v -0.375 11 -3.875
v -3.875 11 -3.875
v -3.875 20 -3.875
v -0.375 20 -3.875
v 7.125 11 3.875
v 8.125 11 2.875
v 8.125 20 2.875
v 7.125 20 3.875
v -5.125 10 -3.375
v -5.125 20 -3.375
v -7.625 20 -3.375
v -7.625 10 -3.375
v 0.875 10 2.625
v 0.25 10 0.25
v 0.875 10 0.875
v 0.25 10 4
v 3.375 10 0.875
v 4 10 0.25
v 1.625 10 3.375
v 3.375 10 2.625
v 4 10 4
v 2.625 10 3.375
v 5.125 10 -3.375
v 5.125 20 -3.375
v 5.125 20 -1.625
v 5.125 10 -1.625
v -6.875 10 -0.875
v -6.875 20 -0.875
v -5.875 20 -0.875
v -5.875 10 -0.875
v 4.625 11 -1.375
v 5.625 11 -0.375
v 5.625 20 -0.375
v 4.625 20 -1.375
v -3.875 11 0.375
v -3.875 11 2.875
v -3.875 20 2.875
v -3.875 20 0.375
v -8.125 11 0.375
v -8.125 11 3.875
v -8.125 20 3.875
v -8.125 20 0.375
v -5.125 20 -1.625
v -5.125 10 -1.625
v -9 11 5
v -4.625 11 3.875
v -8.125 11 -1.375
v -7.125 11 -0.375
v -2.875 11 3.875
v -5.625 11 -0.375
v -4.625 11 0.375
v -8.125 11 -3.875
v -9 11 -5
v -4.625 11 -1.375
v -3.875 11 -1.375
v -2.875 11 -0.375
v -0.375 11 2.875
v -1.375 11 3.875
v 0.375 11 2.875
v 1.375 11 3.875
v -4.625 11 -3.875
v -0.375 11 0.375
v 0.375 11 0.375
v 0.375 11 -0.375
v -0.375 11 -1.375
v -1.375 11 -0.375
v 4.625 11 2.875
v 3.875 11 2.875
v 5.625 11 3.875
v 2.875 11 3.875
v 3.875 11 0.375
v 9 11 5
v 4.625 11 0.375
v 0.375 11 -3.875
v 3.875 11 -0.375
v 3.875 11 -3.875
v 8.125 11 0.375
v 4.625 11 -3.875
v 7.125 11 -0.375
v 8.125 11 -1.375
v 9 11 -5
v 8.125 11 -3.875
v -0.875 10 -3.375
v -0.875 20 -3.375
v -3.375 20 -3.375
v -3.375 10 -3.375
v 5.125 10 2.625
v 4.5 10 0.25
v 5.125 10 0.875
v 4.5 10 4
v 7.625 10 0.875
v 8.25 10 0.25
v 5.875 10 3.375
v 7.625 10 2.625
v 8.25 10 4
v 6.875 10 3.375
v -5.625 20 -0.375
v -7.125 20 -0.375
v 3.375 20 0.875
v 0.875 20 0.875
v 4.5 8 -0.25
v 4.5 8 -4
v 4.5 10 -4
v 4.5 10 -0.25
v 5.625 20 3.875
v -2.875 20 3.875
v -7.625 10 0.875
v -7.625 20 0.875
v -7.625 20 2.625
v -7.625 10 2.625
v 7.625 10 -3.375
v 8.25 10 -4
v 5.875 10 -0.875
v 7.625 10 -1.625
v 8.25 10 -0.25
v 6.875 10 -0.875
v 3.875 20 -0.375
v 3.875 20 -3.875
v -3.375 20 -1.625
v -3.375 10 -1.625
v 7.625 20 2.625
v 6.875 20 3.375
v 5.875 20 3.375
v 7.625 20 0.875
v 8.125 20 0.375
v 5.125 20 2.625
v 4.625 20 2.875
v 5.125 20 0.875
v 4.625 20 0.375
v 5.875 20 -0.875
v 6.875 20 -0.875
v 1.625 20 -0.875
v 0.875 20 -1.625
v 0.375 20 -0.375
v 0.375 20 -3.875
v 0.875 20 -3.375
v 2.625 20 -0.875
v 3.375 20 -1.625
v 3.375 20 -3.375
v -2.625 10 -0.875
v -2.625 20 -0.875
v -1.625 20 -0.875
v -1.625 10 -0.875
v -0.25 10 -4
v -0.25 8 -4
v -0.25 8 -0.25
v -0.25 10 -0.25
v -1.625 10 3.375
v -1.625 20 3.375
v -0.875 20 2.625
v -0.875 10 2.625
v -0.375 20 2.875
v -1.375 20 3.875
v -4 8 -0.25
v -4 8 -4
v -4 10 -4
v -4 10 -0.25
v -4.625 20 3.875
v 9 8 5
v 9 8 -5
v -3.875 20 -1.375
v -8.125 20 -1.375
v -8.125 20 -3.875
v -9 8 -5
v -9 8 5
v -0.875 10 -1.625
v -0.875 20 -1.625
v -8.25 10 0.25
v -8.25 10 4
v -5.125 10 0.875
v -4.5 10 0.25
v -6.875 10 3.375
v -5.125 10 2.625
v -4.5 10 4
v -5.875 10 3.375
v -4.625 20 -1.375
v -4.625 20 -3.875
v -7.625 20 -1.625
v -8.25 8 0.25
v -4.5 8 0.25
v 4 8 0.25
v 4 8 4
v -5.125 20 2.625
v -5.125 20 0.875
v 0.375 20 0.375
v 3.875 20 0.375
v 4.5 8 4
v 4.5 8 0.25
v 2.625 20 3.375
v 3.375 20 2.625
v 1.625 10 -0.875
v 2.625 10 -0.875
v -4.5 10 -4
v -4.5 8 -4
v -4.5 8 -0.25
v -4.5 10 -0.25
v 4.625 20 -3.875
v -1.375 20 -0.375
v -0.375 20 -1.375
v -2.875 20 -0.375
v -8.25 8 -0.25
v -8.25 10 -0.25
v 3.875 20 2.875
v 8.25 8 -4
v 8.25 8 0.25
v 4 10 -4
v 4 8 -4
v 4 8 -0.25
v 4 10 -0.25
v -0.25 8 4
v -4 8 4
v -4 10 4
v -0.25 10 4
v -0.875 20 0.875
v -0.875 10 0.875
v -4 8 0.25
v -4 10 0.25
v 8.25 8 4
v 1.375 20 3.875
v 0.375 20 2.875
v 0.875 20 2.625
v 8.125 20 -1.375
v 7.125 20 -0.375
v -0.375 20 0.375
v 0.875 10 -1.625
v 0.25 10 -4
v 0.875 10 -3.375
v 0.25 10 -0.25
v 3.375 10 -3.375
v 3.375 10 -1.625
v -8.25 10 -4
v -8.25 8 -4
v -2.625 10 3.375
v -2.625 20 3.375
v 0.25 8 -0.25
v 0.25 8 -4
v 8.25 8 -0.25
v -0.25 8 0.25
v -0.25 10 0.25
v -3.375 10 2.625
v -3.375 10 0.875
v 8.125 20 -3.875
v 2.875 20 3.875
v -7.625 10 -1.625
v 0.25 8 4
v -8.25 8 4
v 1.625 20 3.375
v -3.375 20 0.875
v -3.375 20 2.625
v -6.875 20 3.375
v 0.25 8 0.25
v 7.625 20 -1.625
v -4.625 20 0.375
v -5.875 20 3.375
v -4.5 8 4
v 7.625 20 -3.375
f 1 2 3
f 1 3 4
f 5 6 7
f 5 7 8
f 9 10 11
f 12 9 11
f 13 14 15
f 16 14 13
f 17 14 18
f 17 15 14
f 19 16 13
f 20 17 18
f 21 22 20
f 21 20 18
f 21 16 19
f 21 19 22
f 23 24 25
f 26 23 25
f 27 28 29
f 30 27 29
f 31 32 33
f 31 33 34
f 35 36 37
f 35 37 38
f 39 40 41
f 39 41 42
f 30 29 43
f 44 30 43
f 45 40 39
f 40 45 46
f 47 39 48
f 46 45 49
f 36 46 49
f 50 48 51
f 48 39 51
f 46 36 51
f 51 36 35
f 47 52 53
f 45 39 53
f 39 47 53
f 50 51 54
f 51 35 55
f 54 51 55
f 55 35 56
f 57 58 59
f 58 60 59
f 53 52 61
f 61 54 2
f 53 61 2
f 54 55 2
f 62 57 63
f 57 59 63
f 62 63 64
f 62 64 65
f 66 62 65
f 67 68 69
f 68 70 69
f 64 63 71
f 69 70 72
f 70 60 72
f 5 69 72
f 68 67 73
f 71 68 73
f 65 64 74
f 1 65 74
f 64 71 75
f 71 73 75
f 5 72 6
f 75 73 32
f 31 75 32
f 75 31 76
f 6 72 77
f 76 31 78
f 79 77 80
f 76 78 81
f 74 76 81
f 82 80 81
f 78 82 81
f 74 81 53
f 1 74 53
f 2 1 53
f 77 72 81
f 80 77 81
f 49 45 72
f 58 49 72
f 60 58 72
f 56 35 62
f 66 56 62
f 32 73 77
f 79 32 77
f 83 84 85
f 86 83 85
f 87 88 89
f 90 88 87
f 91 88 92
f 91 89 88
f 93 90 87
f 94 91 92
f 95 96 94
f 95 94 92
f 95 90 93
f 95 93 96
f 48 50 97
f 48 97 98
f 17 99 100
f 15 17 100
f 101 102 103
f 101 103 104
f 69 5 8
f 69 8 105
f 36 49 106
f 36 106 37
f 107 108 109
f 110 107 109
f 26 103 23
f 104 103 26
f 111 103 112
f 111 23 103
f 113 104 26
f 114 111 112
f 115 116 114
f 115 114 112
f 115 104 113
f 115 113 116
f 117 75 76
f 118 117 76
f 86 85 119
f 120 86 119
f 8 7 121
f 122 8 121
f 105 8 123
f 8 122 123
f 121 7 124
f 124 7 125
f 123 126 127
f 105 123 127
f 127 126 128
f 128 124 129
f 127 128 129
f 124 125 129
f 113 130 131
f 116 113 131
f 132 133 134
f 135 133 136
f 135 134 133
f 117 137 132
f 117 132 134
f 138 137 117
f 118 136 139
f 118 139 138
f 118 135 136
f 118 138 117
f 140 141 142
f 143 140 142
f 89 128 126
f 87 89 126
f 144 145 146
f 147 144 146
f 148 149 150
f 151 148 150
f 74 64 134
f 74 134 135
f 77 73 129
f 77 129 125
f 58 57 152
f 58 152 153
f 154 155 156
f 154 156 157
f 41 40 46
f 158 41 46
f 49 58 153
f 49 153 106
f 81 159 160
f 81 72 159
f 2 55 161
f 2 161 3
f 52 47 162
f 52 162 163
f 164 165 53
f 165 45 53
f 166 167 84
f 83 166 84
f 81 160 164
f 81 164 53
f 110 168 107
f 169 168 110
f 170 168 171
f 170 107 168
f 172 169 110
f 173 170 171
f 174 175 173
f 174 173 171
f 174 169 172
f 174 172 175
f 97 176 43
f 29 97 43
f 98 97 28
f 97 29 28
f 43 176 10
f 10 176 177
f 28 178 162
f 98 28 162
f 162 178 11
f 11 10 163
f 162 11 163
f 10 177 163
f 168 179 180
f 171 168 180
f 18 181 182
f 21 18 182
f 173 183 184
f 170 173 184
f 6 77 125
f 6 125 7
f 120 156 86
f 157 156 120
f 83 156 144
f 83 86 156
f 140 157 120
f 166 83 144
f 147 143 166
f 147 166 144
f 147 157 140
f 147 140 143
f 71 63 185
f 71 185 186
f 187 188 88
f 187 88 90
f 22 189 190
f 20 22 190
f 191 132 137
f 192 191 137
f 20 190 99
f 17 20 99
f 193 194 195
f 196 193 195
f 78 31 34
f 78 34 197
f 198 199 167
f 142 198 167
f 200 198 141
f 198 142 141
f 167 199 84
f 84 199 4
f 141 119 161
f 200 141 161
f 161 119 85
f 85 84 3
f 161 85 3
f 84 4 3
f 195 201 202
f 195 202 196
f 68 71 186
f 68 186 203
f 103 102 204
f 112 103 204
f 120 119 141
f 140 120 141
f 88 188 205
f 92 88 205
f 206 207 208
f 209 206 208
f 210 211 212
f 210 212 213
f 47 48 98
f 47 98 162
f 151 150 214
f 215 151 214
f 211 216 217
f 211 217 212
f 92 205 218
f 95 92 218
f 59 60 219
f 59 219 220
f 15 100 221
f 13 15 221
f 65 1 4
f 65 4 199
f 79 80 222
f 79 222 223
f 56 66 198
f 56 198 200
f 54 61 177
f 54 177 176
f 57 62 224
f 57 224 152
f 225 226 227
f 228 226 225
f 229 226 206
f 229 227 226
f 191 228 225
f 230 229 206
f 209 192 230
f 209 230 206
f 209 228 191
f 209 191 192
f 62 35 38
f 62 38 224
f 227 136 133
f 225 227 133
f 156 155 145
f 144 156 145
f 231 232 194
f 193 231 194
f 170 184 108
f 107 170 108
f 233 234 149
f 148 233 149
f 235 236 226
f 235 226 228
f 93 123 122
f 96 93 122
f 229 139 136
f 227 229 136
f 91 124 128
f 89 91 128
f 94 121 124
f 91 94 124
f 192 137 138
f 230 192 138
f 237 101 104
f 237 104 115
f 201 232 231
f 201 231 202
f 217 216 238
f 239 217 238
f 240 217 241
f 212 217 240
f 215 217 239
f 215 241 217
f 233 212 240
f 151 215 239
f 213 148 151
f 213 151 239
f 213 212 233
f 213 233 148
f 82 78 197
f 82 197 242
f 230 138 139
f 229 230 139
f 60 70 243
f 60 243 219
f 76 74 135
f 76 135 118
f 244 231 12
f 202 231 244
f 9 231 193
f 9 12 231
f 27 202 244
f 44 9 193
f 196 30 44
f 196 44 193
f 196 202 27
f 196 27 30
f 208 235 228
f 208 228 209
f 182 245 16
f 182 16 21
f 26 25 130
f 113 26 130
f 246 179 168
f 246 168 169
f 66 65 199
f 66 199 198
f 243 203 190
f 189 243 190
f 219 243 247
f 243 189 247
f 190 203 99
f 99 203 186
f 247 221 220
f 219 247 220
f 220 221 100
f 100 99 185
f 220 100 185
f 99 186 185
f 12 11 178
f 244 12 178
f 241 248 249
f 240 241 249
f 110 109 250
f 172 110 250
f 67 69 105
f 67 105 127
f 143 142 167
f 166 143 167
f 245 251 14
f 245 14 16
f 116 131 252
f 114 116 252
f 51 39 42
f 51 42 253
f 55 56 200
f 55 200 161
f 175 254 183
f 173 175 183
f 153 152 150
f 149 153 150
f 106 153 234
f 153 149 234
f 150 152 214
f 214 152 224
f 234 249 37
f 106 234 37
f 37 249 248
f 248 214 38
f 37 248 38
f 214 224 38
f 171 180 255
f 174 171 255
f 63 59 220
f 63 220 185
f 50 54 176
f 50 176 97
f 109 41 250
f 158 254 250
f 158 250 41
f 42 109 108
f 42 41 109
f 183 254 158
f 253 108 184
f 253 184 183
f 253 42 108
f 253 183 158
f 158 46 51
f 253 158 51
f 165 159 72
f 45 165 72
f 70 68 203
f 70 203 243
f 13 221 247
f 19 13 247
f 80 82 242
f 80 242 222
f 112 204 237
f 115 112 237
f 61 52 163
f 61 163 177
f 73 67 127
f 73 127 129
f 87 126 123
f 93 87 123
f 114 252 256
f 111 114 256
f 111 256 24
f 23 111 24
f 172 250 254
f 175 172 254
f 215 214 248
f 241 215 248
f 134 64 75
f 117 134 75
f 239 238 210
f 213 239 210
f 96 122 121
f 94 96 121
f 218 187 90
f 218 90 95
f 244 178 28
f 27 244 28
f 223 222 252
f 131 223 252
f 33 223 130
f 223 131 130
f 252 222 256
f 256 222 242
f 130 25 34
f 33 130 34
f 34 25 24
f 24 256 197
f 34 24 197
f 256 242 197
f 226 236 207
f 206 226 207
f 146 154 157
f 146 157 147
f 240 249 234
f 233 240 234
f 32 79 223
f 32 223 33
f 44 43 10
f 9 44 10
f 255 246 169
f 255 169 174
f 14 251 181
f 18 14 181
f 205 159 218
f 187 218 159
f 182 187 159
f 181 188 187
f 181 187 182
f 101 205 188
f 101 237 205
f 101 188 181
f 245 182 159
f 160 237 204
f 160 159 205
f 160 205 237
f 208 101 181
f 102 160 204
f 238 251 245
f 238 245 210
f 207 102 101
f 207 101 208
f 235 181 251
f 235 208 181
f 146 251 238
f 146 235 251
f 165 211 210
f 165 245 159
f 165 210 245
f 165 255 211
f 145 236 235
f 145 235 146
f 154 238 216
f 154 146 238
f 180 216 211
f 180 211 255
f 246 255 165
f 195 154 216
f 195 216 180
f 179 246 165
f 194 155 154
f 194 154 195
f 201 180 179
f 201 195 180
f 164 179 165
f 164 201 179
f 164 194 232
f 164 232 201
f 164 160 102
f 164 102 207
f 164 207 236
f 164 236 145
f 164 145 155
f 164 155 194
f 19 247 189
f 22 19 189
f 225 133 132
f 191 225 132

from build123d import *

# Parameters (mm, degrees)
SKIZZE1_W                       = 10
SKIZZE1_H                       = 11
AUFSATZ_LINEAR_AUSTRAGEN1_DEPTH = 9
SKIZZE2_W                       = 1.5
SKIZZE2_H                       = 1
AUFSATZ_LINEAR_AUSTRAGEN2_DEPTH = 9
SKIZZE6_W                       = 3.75
SKIZZE6_H                       = 3.75
SCHNITT_LINEAR_AUSTRAGEN2_DEPTH = 10
LINEARES_MUSTER1_COUNT          = 4
LINEARES_MUSTER1_PITCH          = 4.25
LINEARES_MUSTER1_COUNT_DIR2     = 2
LINEARES_MUSTER1_PITCH_DIR2     = 4.25
SKIZZE7_W                       = 3.5
SKIZZE7_H                       = 3.5
AUFSATZ_LINEAR_AUSTRAGEN5_DEPTH = 9
LINEARES_MUSTER2_COUNT          = 3
LINEARES_MUSTER2_PITCH          = 4.25
LINEARES_MUSTER2_COUNT_DIR2     = 2
LINEARES_MUSTER2_PITCH_DIR2     = 4.25
AUFSATZ_LINEAR_AUSTRAGEN7_DEPTH = 9
LINEARES_MUSTER4_COUNT          = 4
LINEARES_MUSTER4_PITCH          = 4.25
LINEARES_MUSTER4_COUNT_DIR2     = 2
LINEARES_MUSTER4_PITCH_DIR2     = 4.25
SCHNITT_LINEAR_AUSTRAGEN4_DEPTH = 23.874658467
LINEARES_MUSTER6_COUNT          = 4
LINEARES_MUSTER6_PITCH          = 4.25
LINEARES_MUSTER6_COUNT_DIR2     = 2
LINEARES_MUSTER6_PITCH_DIR2     = 4.25
SKETCH_3_W                      = 20.071123044
SKETCH_3_H                      = 21.030403289
CUT_EXTRUDE_1_DEPTH             = 8


with BuildPart() as part:
    # Skizze1 → Aufsatz-Linear austragen1 (new, symmetric)
    with BuildSketch(Plane(origin=(0, 0, 0), x_dir=(0, 0, -1), z_dir=(1, 0, 0))):
        with Locations((0, 5.5)):
            Rectangle(SKIZZE1_W, SKIZZE1_H)
    extrude(amount=AUFSATZ_LINEAR_AUSTRAGEN1_DEPTH, both=True)

    # Skizze2 → Aufsatz-Linear austragen2 (add, symmetric)
    with BuildSketch(Plane(origin=(0, 0, 0), x_dir=(0, 0, -1), z_dir=(1, 0, 0))):
        with Locations((-5.75, 0.5)):
            Rectangle(SKIZZE2_W, SKIZZE2_H)
        with Locations((5.75, 0.5)):
            Rectangle(SKIZZE2_W, SKIZZE2_H)
    extrude(amount=AUFSATZ_LINEAR_AUSTRAGEN2_DEPTH, both=True)

    # Skizze6 → Schnitt-Linear austragen2 (cut)
    with BuildSketch(Plane.XZ):
        with Locations((-6.375, -2.125)):
            Rectangle(SKIZZE6_W, SKIZZE6_H)
    schnitt_linear_austragen2 = extrude(amount=-SCHNITT_LINEAR_AUSTRAGEN2_DEPTH, mode=Mode.SUBTRACT)

    # Lineares Muster1: Schnitt-Linear austragen2 4 × 2
    with Locations(*[(i * LINEARES_MUSTER1_PITCH, 0, j * LINEARES_MUSTER1_PITCH_DIR2) for i in range(LINEARES_MUSTER1_COUNT) for j in range(LINEARES_MUSTER1_COUNT_DIR2) if (i, j) != (0, 0)]):
        add(schnitt_linear_austragen2, mode=Mode.SUBTRACT)

    # Skizze7 → Aufsatz-Linear austragen5 (add)
    with BuildSketch(Plane(origin=(0, 11, 0), x_dir=(1, 0, 0), z_dir=(0, 1, 0))):
        with Locations((-6.375, -2.125)):
            Rectangle(SKIZZE7_W, SKIZZE7_H)
    aufsatz_linear_austragen5 = extrude(amount=AUFSATZ_LINEAR_AUSTRAGEN5_DEPTH)

    # Lineares Muster2: Aufsatz-Linear austragen5 3 × 2, 4 skipped
    with Locations(*[(i * LINEARES_MUSTER2_PITCH, 0, -j * LINEARES_MUSTER2_PITCH_DIR2) for i in range(LINEARES_MUSTER2_COUNT) for j in range(LINEARES_MUSTER2_COUNT_DIR2) if (i, j) not in ((0, 0), (0, 1), (1, 0), (1, 1), (2, 0))]):
        add(aufsatz_linear_austragen5)

    # Skizze10 → Aufsatz-Linear austragen7 (add)
    with BuildSketch(Plane(origin=(0, 11, 0), x_dir=(1, 0, 0), z_dir=(0, 1, 0))):
        Polygon((-4.625, 1.375), (-5.625, 0.375), (-7.125, 0.375), (-8.125, 1.375), (-8.125, 3.875), (-4.625, 3.875), align=None)
    aufsatz_linear_austragen7 = extrude(amount=AUFSATZ_LINEAR_AUSTRAGEN7_DEPTH)

    # Lineares Muster4: Aufsatz-Linear austragen7 4 × 2, 2 skipped
    with Locations(*[(i * LINEARES_MUSTER4_PITCH, 0, j * LINEARES_MUSTER4_PITCH_DIR2) for i in range(LINEARES_MUSTER4_COUNT) for j in range(LINEARES_MUSTER4_COUNT_DIR2) if (i, j) not in ((0, 0), (0, 1), (2, 0))]):
        add(aufsatz_linear_austragen7)

    # Skizze12 → Schnitt-Linear austragen4 (cut, through all)
    with BuildSketch(Plane(origin=(0, 20, 0), x_dir=(1, 0, 0), z_dir=(0, 1, 0))):
        Polygon((-5.875, 0.875), (-5.125, 1.625), (-5.125, 3.375), (-7.625, 3.375), (-7.625, 1.625), (-6.875, 0.875), align=None)
    schnitt_linear_austragen4 = extrude(amount=-SCHNITT_LINEAR_AUSTRAGEN4_DEPTH, mode=Mode.SUBTRACT)

    # Lineares Muster6: Schnitt-Linear austragen4 4 × 2
    with Locations(*[(i * LINEARES_MUSTER6_PITCH, 0, j * LINEARES_MUSTER6_PITCH_DIR2) for i in range(LINEARES_MUSTER6_COUNT) for j in range(LINEARES_MUSTER6_COUNT_DIR2) if (i, j) != (0, 0)]):
        add(schnitt_linear_austragen4, mode=Mode.SUBTRACT)

    # 草图3 → 切除-拉伸1 (cut)
    with BuildSketch(Plane(origin=(0, 0, 0), x_dir=(-1, 0, 0), z_dir=(0, -1, 0))):
        with Locations((-0.428033297, -0.424589463)):
            Rectangle(SKETCH_3_W, SKETCH_3_H)
    extrude(amount=-CUT_EXTRUDE_1_DEPTH, mode=Mode.SUBTRACT)


solid = part.part
